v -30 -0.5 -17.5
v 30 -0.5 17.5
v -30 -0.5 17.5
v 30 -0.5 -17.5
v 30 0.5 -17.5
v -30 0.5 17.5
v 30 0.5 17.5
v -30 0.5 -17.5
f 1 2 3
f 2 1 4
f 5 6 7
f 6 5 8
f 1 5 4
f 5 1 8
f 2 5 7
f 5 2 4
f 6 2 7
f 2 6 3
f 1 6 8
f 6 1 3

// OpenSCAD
echo("Работа Воробьева Савелия");
w_frame = 65;
d_frame = 5;
h_frame = 41;
thickness_frame = 4;

w_back = 60;
h_back = 35;
thickness_back = 1;


rotate([90, 0, 0])
backlight();

module backlight() {
  color("lightgreen")
  cube([w_back, h_back, thickness_back], center=true);
}

module frame1() {
  difference(){
    cube([w_frame,d_frame,h_frame],center=true);
    color("red")
    cube([w_frame-2*thickness_frame, d_frame+1, h_frame-2*thickness_frame], center = true);    
  }
}
